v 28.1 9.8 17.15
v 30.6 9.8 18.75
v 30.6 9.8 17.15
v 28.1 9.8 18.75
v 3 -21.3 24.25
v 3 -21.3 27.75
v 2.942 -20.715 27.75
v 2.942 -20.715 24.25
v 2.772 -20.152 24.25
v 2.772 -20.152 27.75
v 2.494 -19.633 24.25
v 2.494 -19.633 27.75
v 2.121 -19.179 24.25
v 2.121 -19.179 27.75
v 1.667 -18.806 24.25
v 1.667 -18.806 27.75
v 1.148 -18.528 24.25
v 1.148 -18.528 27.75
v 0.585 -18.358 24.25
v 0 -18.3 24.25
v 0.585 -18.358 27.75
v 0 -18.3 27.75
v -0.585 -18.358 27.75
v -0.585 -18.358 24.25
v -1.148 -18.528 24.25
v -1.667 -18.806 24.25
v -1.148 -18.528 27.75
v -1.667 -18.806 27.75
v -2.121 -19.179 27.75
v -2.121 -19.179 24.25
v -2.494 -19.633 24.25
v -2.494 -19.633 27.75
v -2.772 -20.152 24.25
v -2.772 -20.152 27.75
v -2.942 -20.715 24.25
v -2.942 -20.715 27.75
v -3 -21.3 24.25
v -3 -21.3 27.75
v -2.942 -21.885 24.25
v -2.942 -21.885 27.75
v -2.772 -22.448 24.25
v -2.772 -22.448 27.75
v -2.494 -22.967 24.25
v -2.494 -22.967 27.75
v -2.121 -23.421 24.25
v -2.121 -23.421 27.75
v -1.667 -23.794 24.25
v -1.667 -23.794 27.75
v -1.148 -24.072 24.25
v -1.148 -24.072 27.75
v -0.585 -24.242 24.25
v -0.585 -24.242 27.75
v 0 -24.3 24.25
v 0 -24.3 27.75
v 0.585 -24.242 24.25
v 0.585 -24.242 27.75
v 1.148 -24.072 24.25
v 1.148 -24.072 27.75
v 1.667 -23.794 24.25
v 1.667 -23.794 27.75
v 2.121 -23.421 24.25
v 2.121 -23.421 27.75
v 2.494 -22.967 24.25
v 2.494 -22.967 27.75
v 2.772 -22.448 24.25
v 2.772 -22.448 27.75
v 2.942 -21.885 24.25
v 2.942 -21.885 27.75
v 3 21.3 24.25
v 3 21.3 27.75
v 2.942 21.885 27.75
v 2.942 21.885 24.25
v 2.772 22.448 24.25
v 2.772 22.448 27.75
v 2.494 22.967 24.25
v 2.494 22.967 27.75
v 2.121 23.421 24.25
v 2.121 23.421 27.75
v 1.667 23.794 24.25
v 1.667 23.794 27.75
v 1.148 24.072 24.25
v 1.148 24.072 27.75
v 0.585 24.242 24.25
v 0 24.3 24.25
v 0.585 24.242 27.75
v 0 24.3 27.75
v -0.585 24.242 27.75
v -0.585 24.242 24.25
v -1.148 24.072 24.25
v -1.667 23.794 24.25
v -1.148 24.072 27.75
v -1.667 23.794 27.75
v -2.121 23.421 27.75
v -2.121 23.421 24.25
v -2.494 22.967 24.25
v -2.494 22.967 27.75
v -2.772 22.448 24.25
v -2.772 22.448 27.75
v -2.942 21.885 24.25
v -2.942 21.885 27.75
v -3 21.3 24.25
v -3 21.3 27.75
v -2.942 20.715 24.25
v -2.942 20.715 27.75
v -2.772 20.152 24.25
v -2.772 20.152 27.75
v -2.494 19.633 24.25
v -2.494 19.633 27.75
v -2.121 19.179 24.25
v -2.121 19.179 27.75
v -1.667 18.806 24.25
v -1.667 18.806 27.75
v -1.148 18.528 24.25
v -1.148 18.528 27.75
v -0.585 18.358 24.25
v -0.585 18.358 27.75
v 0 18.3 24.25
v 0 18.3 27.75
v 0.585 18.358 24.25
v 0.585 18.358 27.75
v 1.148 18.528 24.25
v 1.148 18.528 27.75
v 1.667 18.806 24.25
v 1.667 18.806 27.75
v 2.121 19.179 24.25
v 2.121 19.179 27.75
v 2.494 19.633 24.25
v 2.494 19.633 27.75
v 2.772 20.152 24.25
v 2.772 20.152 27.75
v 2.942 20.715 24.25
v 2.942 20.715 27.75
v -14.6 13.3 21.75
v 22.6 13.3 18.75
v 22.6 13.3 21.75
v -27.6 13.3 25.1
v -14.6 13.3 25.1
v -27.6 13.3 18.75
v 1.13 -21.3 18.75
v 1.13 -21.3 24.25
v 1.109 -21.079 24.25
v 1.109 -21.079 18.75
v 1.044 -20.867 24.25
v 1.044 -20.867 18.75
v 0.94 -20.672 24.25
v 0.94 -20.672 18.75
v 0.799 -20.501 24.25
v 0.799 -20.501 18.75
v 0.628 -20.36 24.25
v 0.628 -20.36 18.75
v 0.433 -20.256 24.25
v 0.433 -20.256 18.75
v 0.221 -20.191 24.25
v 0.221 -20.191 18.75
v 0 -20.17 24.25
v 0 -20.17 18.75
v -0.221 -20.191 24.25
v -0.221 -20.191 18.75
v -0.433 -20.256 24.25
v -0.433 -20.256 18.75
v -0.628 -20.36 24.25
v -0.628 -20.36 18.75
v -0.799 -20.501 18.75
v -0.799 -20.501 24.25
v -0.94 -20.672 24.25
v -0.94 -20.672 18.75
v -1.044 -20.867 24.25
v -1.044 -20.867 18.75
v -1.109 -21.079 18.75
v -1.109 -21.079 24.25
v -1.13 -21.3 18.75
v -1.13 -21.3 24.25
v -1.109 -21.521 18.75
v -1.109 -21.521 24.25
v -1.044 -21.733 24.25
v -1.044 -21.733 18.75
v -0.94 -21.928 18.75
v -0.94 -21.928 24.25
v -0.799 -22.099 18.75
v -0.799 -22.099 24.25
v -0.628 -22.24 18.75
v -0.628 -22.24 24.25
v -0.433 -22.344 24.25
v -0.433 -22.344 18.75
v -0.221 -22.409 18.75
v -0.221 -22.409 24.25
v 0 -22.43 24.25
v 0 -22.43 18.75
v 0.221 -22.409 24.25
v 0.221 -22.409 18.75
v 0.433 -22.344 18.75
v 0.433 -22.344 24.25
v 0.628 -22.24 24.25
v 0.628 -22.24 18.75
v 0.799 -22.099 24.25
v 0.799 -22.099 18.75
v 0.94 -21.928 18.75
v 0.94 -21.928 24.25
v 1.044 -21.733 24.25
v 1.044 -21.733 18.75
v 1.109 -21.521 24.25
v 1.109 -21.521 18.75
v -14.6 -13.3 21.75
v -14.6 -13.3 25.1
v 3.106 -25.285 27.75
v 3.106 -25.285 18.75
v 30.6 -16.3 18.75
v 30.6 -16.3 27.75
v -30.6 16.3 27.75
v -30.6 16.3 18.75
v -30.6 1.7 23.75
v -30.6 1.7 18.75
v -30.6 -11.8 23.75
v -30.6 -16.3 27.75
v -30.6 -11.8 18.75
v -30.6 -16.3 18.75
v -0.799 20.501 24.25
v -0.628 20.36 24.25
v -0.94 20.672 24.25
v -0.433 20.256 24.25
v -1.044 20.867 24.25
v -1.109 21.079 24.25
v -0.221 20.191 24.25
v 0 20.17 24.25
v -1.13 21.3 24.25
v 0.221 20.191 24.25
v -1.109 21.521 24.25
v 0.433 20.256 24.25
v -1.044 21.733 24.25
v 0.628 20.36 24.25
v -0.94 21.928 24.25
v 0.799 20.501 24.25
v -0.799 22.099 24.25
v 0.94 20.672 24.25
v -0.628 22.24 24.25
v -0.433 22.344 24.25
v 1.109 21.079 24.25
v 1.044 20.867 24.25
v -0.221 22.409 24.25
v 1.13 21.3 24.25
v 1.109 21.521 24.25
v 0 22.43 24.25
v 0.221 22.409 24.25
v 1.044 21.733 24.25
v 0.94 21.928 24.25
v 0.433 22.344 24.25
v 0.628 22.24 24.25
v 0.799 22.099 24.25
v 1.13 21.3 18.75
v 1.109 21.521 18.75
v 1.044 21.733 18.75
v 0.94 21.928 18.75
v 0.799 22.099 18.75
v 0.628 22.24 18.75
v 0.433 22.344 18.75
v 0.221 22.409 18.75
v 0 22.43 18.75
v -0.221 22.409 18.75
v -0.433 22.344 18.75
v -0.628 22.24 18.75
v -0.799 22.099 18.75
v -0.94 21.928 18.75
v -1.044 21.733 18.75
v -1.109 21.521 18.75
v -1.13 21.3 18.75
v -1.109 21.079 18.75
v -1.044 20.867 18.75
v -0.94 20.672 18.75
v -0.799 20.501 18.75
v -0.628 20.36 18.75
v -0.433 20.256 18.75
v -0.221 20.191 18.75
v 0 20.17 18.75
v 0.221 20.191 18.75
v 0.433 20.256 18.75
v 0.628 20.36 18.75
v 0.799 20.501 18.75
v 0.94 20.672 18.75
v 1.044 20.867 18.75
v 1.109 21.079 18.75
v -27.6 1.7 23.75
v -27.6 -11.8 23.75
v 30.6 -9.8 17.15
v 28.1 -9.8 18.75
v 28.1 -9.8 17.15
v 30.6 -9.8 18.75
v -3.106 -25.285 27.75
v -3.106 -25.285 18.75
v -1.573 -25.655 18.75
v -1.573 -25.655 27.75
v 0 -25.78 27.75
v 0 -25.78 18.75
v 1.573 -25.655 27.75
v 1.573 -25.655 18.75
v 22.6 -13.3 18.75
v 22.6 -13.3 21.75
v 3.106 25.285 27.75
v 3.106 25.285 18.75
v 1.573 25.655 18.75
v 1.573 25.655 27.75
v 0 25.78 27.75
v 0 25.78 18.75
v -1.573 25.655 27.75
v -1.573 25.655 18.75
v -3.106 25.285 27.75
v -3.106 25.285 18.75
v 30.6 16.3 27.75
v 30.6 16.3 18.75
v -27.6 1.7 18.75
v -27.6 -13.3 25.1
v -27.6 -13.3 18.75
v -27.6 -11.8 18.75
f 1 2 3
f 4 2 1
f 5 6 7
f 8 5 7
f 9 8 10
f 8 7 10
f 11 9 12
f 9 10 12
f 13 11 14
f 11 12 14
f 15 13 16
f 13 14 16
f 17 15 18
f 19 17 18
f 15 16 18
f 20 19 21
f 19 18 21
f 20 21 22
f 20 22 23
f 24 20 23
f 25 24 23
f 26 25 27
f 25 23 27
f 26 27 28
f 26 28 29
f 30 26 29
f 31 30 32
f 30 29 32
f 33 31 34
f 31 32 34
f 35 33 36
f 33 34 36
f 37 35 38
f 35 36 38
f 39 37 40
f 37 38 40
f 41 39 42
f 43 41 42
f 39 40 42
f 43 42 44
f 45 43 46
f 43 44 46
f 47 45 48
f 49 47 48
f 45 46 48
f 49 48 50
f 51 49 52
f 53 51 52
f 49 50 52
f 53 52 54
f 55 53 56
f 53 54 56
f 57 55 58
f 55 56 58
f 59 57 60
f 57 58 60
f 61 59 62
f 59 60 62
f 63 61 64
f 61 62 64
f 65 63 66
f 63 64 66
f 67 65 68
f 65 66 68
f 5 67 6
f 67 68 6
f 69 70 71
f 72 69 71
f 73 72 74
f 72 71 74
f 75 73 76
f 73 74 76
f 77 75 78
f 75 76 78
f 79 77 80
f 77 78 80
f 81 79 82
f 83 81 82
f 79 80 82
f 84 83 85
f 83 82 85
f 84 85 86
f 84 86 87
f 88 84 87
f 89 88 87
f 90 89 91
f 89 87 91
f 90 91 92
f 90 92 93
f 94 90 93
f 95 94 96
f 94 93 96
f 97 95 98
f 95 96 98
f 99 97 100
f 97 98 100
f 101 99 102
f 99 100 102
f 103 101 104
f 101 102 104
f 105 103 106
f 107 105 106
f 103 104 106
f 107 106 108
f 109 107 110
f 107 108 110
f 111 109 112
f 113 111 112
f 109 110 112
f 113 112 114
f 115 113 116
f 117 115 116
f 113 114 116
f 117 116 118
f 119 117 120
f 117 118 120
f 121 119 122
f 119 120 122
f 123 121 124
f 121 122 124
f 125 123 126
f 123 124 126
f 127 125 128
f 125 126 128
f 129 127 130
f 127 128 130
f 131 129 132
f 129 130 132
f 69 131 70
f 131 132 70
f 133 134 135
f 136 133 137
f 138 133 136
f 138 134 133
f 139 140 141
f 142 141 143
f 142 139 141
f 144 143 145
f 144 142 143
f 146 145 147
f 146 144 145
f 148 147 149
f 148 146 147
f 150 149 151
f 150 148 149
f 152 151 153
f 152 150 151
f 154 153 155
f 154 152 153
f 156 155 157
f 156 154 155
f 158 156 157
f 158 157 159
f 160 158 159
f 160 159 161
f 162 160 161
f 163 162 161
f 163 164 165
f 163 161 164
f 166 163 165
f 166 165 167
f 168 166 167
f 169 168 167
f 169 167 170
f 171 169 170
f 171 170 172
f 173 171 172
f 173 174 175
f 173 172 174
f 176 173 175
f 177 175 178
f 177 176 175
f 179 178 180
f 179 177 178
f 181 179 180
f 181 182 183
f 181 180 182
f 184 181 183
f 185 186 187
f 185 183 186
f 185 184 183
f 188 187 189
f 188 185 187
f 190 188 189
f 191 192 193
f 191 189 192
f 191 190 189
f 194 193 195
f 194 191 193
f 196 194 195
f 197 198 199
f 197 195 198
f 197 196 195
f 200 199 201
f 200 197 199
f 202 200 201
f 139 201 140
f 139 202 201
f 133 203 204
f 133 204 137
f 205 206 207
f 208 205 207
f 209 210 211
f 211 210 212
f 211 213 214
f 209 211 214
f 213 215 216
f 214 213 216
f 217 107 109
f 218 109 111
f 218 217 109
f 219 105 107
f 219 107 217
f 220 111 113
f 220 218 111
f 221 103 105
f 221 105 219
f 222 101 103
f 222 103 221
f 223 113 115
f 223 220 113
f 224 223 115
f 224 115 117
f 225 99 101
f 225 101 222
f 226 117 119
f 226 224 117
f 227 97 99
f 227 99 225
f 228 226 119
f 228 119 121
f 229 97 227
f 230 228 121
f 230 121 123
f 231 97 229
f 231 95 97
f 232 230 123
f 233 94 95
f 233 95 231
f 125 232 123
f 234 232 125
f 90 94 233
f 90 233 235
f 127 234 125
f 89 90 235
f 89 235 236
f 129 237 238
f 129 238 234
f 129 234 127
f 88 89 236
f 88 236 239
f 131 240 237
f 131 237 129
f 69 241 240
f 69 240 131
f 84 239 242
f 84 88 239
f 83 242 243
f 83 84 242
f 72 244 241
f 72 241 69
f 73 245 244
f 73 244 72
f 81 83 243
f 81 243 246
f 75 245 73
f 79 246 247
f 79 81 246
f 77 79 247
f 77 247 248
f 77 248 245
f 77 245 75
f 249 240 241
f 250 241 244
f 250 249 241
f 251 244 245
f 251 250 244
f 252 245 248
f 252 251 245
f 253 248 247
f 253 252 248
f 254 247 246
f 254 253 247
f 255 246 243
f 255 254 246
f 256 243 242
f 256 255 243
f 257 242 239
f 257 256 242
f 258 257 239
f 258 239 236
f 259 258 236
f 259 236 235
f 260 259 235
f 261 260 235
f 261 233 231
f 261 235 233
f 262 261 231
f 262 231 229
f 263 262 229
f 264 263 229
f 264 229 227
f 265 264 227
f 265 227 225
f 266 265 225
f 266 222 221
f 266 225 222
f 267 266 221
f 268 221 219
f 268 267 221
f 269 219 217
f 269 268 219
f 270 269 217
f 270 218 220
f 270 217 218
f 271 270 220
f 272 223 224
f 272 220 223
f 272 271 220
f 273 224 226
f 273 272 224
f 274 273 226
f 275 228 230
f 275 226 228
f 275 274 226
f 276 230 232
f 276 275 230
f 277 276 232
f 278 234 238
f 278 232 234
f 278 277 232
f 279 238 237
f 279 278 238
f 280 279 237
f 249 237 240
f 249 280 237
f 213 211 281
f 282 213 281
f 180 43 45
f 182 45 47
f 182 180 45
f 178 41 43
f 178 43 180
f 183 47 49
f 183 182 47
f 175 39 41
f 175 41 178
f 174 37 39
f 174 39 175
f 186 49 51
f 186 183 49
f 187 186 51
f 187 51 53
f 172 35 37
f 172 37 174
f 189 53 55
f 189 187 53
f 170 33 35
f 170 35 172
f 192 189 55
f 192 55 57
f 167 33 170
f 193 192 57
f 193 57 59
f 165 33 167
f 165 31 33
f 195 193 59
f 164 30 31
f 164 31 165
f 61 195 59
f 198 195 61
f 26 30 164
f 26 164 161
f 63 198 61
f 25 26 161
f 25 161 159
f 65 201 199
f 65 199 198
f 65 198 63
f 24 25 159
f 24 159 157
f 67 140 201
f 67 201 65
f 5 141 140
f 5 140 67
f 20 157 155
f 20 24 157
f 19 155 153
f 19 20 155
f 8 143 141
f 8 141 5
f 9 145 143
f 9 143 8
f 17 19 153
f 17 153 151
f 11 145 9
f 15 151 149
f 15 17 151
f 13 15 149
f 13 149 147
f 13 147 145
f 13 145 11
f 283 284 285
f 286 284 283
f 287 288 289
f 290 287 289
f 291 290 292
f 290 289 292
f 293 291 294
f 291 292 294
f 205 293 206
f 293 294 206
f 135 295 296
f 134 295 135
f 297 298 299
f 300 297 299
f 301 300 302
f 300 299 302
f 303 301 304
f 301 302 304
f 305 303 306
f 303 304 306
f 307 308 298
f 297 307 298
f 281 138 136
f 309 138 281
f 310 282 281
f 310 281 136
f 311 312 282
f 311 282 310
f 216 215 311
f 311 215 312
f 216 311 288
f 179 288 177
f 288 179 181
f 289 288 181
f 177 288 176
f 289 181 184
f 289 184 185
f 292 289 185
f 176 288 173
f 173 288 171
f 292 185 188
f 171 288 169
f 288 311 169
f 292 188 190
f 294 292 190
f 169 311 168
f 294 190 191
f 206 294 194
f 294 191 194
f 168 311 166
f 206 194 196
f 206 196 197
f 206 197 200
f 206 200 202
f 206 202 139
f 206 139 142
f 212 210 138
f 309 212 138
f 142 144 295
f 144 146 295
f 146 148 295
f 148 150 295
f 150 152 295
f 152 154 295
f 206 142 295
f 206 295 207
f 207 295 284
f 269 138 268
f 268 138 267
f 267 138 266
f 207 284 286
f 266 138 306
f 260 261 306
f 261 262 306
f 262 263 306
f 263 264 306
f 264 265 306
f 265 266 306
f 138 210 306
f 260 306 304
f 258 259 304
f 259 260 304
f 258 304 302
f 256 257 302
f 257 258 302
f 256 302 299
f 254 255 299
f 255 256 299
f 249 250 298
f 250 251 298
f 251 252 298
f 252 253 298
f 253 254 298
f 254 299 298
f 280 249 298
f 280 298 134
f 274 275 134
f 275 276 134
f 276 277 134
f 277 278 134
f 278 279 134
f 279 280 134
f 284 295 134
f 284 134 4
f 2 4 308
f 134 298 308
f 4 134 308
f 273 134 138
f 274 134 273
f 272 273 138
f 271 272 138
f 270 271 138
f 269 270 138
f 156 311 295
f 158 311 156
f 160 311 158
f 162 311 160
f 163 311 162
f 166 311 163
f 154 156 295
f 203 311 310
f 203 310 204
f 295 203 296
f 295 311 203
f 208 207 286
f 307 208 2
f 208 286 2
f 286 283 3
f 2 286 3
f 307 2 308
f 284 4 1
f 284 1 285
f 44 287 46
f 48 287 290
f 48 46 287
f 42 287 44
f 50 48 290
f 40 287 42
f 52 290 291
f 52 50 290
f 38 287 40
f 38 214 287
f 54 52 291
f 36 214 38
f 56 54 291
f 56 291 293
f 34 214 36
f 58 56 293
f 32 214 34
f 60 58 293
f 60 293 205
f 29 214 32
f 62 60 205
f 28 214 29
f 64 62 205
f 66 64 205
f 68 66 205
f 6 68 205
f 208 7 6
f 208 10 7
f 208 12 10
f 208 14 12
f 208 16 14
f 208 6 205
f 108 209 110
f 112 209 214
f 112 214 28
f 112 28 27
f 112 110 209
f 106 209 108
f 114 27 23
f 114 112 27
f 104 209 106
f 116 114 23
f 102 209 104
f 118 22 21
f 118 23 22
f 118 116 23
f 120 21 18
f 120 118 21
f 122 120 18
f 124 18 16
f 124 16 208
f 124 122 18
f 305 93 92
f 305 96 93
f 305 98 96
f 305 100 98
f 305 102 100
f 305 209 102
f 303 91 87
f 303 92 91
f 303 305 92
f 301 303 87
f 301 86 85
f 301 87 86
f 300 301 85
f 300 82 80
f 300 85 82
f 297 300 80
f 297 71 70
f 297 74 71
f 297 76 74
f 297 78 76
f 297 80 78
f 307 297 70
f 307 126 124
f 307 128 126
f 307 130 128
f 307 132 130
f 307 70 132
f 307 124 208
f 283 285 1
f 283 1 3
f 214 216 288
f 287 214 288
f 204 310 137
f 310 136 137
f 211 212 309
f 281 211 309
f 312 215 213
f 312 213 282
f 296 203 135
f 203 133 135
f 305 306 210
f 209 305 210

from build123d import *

# Parameters (mm, degrees)
F2_DEPTH = 1.6
F1_R     = 3
F1_W     = 3
F1_H     = 13.5
F1_H_2   = 11.6
F1_R_2   = 1.1303
F1_H_3   = 1.5
F3_DEPTH = 9
F4_DEPTH = 3
F5_DEPTH = 5
F6_DEPTH = 6.35
F7_R     = 3
F8_DEPTH = 3.5


with BuildPart() as f2:
    # F1 (on offset) → F2 (new body)
    with BuildSketch(Plane.XY.offset(18.75)):
        Polygon((28.1, -9.8), (30.6, -9.8), (30.6, 9.8), (28.1, 9.8), (28.1, 0), align=None)
    extrude(amount=-F2_DEPTH)

    # F1 (on offset) → F3 (join)
    with BuildSketch(Plane.XY.offset(18.75)):
        Polygon((-14.6, -13.3), (22.6, -13.3), (22.6, -10.3), (22.6, 10.3), (22.6, 13.3), (-14.6, 13.3), align=None)
        Polygon((-27.6, -13.3), (-14.6, -13.3), (-14.6, 13.3), (-27.6, 13.3), (-27.6, 1.7), (-27.6, -11.8), align=None)
        with BuildLine():
            Line((3.1063091707, -25.2848662841), (30.6, -16.3))
            Line((30.6, -16.3), (-30.6, -16.3))
            Line((-30.6, -16.3), (-3.1063091707, -25.2848662841))
            ThreePointArc((-3.1063091707, -25.2848662841), (0, -25.7795602219), (3.1063091707, -25.2848662841))
        make_face()
        with Locations((0, -21.3)):
            Circle(F1_R, mode=Mode.SUBTRACT)
        with BuildLine():
            Line((-30.6, 16.3), (30.6, 16.3))
            Line((30.6, 16.3), (3.1063091707, 25.2848662841))
            ThreePointArc((3.1063091707, 25.2848662841), (0, 25.7795602219), (-3.1063091707, 25.2848662841))
            Line((-3.1063091707, 25.2848662841), (-30.6, 16.3))
        make_face()
        with Locations((0, 21.3)):
            Circle(F1_R, mode=Mode.SUBTRACT)
        Polygon((27.6, -10.3), (27.6, -13.3), (22.6, -13.3), (-14.6, -13.3), (-27.6, -13.3), (-30.6, -13.3), (-30.6, -16.3), (30.6, -16.3), (30.6, -10.3), align=None)
        Polygon((27.6, 13.3), (27.6, 10.3), (30.6, 10.3), (30.6, 16.3), (-30.6, 16.3), (-30.6, 13.3), (-27.6, 13.3), (-14.6, 13.3), (22.6, 13.3), align=None)
        Polygon((22.6, -13.3), (27.6, -13.3), (27.6, -10.3), (27.6, 10.3), (27.6, 13.3), (22.6, 13.3), (22.6, 10.3), (22.6, -10.3), align=None)
        Polygon((28.1, -9.8), (30.6, -9.8), (30.6, 9.8), (28.1, 9.8), (28.1, 0), align=None)
        with Locations((-29.1, -5.05)):
            Rectangle(F1_W, F1_H)
        with Locations((-29.1, 7.5)):
            Rectangle(F1_W, F1_H_2)
        with Locations((0, 21.3)):
            Circle(F1_R)
        with Locations((0, 21.3)):
            Circle(F1_R_2, mode=Mode.SUBTRACT)
        with Locations((0, -21.3)):
            Circle(F1_R)
        with Locations((0, -21.3)):
            Circle(F1_R_2, mode=Mode.SUBTRACT)
        Polygon((27.6, 10.3), (27.6, -10.3), (30.6, -10.3), (30.6, -9.8), (28.1, -9.8), (28.1, 0), (28.1, 9.8), (30.6, 9.8), (30.6, 10.3), align=None)
        with Locations((-29.1, -12.55)):
            Rectangle(F1_W, F1_H_3)
        with Locations((0, -21.3)):
            Circle(F1_R_2)
    extrude(amount=F3_DEPTH)

    # F1 (on offset) → F4 (cut)
    with BuildSketch(Plane.XY.offset(18.75)):
        Polygon((-14.6, -13.3), (22.6, -13.3), (22.6, -10.3), (22.6, 10.3), (22.6, 13.3), (-14.6, 13.3), align=None)
        with Locations((0, -21.3)):
            Circle(F1_R_2)
    extrude(amount=F4_DEPTH, mode=Mode.SUBTRACT)

    # F1 (on offset) → F5 (cut)
    with BuildSketch(Plane.XY.offset(18.75)):
        with Locations((-29.1, -5.05)):
            Rectangle(F1_W, F1_H)
        with Locations((0, -21.3)):
            Circle(F1_R_2)
    extrude(amount=F5_DEPTH, mode=Mode.SUBTRACT)

    # F1 (on offset) → F6 (cut)
    with BuildSketch(Plane.XY.offset(18.75)):
        Polygon((-27.6, -13.3), (-14.6, -13.3), (-14.6, 13.3), (-27.6, 13.3), (-27.6, 1.7), (-27.6, -11.8), align=None)
        with Locations((0, -21.3)):
            Circle(F1_R_2)
    extrude(amount=F6_DEPTH, mode=Mode.SUBTRACT)

    # F7 (on face) → F8 (cut)
    with BuildSketch(Plane.XY.offset(27.75)):
        with Locations((0, 21.3)):
            Circle(F7_R)
        with Locations((0, -21.3)):
            Circle(F7_R)
    extrude(amount=-F8_DEPTH, mode=Mode.SUBTRACT)


solid = f2.part
